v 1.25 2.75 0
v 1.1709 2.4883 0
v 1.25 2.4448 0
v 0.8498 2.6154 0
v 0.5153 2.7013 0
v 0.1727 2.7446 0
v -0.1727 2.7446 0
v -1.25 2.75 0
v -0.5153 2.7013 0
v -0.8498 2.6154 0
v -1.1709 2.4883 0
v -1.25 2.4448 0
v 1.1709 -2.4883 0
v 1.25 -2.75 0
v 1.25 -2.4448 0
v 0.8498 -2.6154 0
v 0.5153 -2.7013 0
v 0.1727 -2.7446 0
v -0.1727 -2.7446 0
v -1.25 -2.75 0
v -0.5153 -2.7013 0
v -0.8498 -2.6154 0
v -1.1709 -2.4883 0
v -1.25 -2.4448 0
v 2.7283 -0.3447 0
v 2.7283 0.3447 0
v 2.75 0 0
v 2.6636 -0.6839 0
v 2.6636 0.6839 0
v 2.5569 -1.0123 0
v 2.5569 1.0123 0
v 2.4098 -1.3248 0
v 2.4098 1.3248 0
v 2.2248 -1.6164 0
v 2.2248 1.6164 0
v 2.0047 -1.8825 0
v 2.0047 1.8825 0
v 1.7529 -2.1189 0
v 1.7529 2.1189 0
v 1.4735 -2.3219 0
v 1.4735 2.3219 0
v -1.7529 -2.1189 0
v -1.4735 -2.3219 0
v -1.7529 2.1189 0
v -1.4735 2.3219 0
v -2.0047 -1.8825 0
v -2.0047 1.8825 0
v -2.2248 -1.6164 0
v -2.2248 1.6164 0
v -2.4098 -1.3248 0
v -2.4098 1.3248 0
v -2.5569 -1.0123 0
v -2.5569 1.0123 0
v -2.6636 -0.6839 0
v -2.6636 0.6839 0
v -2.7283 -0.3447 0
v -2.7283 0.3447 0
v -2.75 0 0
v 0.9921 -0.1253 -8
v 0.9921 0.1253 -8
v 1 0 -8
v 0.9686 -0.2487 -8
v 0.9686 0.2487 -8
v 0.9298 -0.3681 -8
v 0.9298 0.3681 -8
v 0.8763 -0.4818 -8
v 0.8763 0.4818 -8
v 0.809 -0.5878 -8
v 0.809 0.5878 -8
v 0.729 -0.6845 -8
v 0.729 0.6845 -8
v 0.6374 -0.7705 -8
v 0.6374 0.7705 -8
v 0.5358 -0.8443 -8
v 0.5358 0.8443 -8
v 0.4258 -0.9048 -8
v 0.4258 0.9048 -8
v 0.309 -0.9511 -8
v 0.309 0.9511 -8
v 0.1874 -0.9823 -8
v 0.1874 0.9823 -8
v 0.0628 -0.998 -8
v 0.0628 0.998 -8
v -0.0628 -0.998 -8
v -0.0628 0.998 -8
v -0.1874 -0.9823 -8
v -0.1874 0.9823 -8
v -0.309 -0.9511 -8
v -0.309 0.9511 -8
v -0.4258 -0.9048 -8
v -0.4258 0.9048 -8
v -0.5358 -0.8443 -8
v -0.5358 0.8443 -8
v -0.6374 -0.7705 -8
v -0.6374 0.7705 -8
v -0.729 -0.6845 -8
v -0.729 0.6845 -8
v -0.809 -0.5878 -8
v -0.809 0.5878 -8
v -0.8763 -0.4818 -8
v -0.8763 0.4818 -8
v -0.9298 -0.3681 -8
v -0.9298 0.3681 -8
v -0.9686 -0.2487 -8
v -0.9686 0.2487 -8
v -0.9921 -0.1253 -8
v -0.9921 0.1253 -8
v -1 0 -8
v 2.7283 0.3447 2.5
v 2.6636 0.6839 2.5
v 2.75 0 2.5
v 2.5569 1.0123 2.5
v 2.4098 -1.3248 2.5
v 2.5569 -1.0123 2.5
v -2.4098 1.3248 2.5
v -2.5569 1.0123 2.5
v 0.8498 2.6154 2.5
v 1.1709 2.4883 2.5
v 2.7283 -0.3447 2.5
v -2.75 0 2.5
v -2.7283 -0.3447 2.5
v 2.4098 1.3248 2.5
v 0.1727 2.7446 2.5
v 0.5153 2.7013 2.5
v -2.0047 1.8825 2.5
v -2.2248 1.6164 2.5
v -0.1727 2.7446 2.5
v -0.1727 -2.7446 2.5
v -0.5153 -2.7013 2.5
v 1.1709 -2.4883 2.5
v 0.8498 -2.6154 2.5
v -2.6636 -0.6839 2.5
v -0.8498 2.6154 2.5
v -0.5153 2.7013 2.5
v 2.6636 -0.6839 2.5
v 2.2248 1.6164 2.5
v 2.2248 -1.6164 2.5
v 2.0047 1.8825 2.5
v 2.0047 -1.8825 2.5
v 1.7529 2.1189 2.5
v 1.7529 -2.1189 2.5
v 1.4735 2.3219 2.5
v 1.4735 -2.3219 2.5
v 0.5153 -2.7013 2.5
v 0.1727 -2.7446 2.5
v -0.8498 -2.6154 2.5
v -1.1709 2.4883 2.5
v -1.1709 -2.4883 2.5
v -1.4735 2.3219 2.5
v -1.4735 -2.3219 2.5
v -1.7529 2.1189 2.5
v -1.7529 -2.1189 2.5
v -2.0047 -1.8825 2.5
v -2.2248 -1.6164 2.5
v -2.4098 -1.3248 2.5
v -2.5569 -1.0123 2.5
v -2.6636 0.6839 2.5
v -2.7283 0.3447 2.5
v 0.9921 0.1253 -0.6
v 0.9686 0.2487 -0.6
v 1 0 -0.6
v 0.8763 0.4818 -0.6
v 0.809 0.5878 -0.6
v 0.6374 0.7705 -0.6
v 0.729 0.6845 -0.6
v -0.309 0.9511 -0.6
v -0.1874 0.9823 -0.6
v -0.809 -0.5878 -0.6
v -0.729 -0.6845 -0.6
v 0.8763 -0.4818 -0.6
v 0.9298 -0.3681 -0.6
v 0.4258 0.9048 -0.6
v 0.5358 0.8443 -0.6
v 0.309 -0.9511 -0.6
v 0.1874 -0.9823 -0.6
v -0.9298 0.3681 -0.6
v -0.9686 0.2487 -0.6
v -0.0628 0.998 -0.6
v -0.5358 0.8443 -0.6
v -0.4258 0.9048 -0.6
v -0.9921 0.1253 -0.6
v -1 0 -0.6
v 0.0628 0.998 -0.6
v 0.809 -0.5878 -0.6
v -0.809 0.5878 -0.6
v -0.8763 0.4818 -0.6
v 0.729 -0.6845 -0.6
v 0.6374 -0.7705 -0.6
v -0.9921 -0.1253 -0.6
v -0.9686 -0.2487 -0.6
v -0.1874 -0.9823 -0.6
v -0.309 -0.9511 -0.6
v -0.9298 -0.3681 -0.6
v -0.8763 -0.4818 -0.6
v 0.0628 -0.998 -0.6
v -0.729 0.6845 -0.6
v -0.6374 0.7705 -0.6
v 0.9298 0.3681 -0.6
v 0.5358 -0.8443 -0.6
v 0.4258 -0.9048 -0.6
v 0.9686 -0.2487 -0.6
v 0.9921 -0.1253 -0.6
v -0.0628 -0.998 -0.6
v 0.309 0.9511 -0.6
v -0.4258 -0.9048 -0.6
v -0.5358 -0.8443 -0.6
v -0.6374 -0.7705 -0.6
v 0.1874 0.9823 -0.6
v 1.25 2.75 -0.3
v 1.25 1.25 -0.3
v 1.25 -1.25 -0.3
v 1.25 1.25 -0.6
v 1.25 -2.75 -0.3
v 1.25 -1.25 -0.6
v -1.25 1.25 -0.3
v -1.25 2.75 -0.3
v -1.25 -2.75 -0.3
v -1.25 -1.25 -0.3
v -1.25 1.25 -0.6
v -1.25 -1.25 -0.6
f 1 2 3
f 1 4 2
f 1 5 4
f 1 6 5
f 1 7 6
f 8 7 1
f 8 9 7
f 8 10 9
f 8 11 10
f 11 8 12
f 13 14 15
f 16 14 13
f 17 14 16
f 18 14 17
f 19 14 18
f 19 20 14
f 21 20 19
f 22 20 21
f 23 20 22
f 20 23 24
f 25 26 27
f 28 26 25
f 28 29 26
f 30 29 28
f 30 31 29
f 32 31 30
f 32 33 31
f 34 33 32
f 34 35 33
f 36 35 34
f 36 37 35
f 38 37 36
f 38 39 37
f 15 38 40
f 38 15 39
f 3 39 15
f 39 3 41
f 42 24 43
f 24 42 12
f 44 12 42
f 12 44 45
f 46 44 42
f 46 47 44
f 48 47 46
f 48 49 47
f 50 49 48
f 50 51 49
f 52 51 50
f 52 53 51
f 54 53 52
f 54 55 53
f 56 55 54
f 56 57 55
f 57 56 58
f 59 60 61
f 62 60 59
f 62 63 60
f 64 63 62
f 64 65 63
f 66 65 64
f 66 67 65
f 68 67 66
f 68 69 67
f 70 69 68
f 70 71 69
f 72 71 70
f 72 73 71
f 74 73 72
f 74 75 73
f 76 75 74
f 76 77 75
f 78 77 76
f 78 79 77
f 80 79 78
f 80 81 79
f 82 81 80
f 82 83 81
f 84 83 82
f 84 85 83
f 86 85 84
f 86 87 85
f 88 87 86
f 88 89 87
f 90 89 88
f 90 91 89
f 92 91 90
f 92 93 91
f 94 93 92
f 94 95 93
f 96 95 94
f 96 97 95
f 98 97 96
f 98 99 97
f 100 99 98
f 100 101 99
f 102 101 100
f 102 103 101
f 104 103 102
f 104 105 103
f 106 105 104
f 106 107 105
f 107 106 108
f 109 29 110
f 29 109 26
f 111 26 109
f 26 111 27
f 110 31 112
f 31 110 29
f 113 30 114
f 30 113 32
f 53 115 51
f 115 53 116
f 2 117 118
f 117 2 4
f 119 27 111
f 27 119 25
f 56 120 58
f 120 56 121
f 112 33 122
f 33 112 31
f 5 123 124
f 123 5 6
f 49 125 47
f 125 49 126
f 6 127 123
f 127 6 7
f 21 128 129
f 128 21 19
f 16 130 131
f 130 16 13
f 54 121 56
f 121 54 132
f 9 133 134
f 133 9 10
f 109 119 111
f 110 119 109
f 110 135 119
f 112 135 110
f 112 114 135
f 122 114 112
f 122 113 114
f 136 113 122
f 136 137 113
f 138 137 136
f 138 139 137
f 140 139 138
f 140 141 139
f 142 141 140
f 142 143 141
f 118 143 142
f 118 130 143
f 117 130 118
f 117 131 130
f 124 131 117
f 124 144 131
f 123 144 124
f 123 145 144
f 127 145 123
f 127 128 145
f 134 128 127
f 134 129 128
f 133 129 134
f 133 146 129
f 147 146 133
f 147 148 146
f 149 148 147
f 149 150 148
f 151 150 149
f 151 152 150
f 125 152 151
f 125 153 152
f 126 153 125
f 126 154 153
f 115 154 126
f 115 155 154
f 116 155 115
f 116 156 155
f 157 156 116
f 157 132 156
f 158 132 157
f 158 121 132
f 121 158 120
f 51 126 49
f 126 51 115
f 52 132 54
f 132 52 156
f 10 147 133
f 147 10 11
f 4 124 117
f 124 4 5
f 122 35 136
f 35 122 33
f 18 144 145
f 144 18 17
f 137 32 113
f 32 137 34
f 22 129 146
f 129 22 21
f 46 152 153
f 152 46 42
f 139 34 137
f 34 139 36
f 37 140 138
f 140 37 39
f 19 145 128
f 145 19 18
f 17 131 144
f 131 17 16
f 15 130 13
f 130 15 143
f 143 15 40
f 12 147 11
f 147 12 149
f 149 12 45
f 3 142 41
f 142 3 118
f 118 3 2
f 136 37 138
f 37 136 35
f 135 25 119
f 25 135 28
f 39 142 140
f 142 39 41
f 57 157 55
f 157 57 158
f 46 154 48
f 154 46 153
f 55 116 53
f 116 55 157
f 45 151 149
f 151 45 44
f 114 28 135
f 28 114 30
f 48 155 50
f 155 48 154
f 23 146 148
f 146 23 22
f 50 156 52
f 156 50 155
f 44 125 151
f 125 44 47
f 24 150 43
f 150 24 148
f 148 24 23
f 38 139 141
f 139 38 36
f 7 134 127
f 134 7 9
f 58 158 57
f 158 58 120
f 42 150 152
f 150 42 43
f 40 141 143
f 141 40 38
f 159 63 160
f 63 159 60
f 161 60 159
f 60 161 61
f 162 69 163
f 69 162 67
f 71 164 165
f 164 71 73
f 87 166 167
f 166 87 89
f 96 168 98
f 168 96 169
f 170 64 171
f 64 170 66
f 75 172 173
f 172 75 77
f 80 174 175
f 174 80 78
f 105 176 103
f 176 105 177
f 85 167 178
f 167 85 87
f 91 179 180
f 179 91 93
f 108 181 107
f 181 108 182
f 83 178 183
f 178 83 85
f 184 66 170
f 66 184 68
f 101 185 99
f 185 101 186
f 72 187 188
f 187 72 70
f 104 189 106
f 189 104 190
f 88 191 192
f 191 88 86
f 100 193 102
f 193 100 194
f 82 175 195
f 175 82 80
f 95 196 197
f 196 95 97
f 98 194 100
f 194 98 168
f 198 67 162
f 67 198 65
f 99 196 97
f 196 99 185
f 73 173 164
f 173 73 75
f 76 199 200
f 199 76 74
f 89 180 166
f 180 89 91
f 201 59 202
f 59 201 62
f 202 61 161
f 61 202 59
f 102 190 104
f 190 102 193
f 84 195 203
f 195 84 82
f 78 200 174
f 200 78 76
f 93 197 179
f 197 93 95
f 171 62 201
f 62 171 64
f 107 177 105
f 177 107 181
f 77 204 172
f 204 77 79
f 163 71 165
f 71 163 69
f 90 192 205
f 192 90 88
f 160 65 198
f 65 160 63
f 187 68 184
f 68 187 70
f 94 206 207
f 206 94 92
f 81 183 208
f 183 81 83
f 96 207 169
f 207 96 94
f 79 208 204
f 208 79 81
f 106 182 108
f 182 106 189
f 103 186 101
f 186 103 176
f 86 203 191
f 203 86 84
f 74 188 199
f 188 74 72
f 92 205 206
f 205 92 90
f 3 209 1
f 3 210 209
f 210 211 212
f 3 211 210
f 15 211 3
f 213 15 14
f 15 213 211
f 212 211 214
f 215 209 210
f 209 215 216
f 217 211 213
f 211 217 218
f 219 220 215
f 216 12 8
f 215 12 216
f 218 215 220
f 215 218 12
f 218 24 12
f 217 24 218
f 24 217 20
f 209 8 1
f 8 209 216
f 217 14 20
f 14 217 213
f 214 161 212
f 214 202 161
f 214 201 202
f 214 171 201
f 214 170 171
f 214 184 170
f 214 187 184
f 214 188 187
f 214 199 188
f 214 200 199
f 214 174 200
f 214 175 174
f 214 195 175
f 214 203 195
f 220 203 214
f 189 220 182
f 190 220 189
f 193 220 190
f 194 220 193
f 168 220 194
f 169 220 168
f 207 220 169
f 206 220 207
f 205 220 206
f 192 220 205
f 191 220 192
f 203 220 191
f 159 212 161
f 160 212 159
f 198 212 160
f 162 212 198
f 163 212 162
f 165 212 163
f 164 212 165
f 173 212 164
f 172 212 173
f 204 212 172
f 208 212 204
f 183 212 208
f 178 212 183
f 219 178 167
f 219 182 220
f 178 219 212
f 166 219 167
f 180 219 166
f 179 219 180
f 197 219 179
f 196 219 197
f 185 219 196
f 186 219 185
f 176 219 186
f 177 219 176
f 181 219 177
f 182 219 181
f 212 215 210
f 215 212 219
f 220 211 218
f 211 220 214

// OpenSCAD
$fn = 50;


difference() {
	union() {
		translate(v = [0, 0, 0]) {
			rotate(a = [0, 0, 0]) {
				difference() {
					union() {
						translate(v = [0, 0, -8.0000000000]) {
							cylinder(h = 8, r = 0.7500000000);
						}
						cylinder(h = 2.5000000000, r = 2.7500000000);
						translate(v = [0, 0, -8.0000000000]) {
							cylinder(h = 8, r = 1.0000000000);
						}
						translate(v = [-1.2500000000, -2.7500000000, -0.3000000000]) {
							cube(size = [2.5000000000, 5.5000000000, 0.3000000000]);
						}
						translate(v = [-1.2500000000, -1.2500000000, -0.6000000000]) {
							cube(size = [2.5000000000, 2.5000000000, 0.3000000000]);
						}
						translate(v = [0, 0, -8.0000000000]) {
							cylinder(h = 8, r = 0.7500000000);
						}
					}
					union();
				}
			}
		}
	}
	union();
}
